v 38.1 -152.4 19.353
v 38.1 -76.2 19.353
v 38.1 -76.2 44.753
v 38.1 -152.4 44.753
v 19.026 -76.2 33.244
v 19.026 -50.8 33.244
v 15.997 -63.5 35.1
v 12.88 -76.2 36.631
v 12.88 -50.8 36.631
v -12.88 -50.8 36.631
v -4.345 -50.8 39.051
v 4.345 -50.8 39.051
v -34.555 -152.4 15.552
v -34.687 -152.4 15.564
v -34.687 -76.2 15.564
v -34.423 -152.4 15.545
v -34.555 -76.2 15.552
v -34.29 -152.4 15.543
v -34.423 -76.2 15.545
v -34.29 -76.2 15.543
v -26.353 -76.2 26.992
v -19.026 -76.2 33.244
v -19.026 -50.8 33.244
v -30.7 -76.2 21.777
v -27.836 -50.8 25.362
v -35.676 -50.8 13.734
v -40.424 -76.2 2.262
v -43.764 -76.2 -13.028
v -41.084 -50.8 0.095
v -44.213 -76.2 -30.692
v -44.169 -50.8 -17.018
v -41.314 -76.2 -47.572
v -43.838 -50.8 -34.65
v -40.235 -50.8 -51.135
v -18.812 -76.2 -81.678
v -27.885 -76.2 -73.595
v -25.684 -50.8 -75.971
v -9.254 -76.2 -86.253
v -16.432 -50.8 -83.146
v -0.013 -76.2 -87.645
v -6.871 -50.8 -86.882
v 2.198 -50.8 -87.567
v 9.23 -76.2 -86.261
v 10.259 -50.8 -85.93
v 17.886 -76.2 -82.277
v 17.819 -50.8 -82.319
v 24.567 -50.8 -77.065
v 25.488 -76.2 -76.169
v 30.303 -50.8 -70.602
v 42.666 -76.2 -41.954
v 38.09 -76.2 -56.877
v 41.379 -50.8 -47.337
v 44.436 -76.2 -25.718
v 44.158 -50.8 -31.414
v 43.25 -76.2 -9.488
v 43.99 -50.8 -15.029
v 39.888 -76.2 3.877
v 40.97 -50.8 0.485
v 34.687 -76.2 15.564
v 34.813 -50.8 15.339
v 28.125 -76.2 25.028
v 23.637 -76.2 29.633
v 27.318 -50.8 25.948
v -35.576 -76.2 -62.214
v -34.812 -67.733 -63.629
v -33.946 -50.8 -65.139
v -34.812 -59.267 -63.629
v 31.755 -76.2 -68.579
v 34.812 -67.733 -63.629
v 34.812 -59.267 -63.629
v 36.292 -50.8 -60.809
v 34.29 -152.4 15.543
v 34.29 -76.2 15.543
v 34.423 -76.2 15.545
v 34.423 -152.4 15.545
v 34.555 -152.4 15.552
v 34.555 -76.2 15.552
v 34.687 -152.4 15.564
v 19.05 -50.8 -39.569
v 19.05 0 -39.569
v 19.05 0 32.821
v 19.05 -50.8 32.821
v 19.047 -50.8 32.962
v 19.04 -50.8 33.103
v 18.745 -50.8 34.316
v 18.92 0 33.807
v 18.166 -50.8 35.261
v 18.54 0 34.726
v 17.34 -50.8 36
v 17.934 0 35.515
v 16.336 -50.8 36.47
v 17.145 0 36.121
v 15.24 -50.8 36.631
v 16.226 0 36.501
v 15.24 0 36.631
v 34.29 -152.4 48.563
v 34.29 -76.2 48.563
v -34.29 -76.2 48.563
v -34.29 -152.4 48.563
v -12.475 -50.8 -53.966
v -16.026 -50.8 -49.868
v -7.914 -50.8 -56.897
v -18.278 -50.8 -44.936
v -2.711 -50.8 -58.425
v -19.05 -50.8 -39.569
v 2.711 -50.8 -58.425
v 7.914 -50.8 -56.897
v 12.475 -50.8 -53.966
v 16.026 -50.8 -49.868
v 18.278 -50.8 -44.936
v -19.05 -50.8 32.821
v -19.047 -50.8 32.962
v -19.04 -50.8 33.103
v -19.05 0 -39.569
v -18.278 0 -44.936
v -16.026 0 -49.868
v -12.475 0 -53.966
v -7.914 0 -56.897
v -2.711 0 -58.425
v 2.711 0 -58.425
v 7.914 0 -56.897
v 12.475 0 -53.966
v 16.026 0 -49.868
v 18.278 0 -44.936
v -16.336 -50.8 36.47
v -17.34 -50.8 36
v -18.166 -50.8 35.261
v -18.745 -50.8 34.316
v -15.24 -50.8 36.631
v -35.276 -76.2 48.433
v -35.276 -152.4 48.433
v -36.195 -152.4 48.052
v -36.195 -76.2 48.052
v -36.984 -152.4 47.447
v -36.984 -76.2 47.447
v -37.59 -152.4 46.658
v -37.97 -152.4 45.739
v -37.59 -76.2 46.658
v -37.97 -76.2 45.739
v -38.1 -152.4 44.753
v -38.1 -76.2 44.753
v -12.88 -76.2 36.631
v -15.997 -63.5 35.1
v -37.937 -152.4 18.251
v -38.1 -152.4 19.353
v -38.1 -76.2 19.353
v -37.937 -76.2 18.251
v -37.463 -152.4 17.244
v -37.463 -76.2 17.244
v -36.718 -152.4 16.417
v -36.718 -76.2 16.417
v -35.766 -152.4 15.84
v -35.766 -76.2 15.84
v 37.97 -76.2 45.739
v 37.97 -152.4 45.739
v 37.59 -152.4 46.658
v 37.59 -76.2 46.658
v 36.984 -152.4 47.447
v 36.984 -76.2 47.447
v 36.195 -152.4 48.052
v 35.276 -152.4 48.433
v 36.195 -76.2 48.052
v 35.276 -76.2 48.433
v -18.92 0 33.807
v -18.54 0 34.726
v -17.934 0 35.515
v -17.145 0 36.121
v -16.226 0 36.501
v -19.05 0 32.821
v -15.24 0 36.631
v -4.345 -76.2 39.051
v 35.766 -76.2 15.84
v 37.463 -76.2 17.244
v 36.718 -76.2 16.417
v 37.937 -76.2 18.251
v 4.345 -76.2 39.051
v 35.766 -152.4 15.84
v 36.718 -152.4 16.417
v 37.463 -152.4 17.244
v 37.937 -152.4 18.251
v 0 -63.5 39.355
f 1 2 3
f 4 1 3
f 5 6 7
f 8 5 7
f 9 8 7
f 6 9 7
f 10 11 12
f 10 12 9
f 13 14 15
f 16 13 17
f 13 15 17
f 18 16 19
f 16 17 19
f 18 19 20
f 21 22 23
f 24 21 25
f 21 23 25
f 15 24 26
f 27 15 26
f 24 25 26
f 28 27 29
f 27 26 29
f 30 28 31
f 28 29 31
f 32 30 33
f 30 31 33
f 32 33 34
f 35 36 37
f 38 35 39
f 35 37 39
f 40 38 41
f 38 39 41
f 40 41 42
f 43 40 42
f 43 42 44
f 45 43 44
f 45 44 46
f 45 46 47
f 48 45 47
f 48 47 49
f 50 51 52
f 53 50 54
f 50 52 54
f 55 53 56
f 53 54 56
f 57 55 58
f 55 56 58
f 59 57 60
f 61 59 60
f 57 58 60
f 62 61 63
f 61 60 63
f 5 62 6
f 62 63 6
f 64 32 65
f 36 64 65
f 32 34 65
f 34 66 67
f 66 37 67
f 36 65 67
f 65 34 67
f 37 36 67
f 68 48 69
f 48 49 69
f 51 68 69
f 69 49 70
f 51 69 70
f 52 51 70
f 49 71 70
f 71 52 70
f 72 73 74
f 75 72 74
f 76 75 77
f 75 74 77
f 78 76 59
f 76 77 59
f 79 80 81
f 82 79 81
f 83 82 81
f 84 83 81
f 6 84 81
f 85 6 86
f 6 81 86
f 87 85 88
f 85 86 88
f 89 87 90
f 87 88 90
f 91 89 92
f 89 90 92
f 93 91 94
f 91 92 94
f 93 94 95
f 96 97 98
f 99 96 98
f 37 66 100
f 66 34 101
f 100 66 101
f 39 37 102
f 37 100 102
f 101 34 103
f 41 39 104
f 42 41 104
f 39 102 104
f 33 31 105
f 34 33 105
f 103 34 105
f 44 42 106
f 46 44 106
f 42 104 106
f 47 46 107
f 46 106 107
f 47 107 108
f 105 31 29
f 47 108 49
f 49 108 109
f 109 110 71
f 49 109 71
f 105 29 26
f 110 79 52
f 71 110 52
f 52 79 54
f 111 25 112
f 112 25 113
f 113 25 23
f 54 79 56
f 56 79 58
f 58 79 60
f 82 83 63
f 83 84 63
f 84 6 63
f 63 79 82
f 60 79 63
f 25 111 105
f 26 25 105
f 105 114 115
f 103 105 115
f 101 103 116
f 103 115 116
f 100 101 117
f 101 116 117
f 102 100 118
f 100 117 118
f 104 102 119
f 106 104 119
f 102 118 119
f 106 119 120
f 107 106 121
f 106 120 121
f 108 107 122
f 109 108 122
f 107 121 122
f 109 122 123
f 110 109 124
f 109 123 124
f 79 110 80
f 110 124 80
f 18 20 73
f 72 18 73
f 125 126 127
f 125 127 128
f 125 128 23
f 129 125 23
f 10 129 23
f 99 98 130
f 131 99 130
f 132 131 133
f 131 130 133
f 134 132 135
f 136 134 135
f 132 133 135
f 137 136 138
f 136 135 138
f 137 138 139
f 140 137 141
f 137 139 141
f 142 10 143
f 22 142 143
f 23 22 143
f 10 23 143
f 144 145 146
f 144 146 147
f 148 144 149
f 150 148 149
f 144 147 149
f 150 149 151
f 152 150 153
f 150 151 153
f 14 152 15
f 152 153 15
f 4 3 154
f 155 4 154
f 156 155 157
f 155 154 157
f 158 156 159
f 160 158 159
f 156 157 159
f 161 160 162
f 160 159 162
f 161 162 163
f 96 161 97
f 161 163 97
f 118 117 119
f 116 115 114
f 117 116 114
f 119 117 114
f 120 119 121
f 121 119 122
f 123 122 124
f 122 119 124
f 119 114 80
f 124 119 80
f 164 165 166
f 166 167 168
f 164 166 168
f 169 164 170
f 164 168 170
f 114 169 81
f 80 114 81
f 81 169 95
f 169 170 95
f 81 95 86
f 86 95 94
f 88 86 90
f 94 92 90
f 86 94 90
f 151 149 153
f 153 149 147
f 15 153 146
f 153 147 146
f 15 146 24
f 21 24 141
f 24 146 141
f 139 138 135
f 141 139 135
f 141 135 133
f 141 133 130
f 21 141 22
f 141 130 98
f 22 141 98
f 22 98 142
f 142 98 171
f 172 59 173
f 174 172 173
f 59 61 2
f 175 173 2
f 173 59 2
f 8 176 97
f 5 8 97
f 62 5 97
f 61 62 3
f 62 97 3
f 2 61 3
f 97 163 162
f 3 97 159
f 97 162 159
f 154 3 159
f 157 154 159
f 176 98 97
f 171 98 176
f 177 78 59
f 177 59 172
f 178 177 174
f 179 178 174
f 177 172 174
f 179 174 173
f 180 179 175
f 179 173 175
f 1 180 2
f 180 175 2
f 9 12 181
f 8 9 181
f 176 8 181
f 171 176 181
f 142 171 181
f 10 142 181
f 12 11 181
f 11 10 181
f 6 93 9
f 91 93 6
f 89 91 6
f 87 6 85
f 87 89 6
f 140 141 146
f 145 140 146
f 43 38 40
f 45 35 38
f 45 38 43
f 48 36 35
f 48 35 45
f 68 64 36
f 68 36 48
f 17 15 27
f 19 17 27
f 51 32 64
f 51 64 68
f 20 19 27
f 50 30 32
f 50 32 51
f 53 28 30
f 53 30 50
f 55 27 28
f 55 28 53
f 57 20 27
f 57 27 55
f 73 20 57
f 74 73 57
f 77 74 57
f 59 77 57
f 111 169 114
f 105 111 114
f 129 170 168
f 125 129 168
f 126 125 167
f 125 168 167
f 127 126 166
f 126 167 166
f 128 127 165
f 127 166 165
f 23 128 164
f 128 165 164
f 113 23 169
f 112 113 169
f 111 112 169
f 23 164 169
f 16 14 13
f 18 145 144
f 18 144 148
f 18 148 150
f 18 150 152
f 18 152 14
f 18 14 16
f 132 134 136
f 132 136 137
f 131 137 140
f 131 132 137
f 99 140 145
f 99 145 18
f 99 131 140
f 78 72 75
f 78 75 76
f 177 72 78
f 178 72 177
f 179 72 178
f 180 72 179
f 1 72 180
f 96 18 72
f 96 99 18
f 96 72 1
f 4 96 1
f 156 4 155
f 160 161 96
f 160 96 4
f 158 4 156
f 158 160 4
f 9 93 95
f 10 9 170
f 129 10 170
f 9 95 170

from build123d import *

# Parameters (mm, degrees)
F1_DEPTH = 50.8
F3_DEPTH = 25.4
F5_DEPTH = 76.2


with BuildPart() as f1:
    # F0 (on Front) → F1 (new body)
    with BuildSketch(Plane.XZ):
        with BuildLine():
            ThreePointArc((19.05, 32.821028), (17.934077, 35.515105), (15.24, 36.631028))
            Line((15.24, 36.631028), (-15.24, 36.631028))
            ThreePointArc((-15.24, 36.631028), (-17.934077, 35.515105), (-19.05, 32.821028))
            Line((-19.05, 32.821028), (-19.05, -39.568972))
            Line((-19.05, -39.568972), (19.05, -39.568972))
            Line((19.05, -39.568972), (19.05, 32.821028))
        make_face()
        with BuildLine():
            ThreePointArc((-19.05, -39.568972), (0, -58.618972), (19.05, -39.568972))
            Line((19.05, -39.568972), (-19.05, -39.568972))
        make_face()
    extrude(amount=F1_DEPTH)

    # F2 (on face) → F3 (join)
    with BuildSketch(Plane.XZ.offset(50.8)):
        with BuildLine():
            ThreePointArc((-19.05, 32.821028), (-19.044109, 33.032818), (-19.026454, 33.243953))
            add(Edge.make_bspline(
                [(-19.026454, 33.243953), (-69.624273, -0.990803), (-34.812137, -63.629114), (0, -126.267426), (34.812137, -63.629114), (69.624273, -0.990803), (19.026454, 33.243953)],
                knots=[0.442325, 0.442325, 0.442325, 2.241837, 2.241837, 4.041349, 4.041349, 5.84086, 5.84086, 5.84086], degree=2, weights=[1, 0.621801, 1, 0.621801, 1, 0.621801, 1]))
            ThreePointArc((19.026454, 33.243953), (19.044109, 33.032818), (19.05, 32.821028))
            Line((19.05, 32.821028), (19.05, -39.568972))
            ThreePointArc((19.05, -39.568972), (0, -58.618972), (-19.05, -39.568972))
            Line((-19.05, -39.568972), (-19.05, 32.821028))
        make_face()
        with BuildLine():
            Line((12.879918, 36.631028), (-12.879918, 36.631028))
            add(Edge.make_bspline(
                [(-12.879918, 36.631028), (-16.041278, 35.263738), (-19.026454, 33.243953)],
                knots=[0.293978, 0.293978, 0.293978, 0.442325, 0.442325, 0.442325], degree=2, weights=[1, 0.99725, 1]))
            ThreePointArc((-19.026454, 33.243953), (-19.044109, 33.032818), (-19.05, 32.821028))
            Line((-19.05, 32.821028), (-19.05, -39.568972))
            ThreePointArc((-19.05, -39.568972), (0, -58.618972), (19.05, -39.568972))
            Line((19.05, -39.568972), (19.05, 32.821028))
            ThreePointArc((19.05, 32.821028), (19.044109, 33.032818), (19.026454, 33.243953))
            add(Edge.make_bspline(
                [(19.026454, 33.243953), (16.041278, 35.263738), (12.879918, 36.631028)],
                knots=[5.84086, 5.84086, 5.84086, 5.989207, 5.989207, 5.989207], degree=2, weights=[1, 0.99725, 1]))
        make_face()
        with BuildLine():
            add(Edge.make_bspline(
                [(12.879918, 36.631028), (6.581128, 39.355257), (0, 39.355257)],
                knots=[5.989207, 5.989207, 5.989207, 6.283185, 6.283185, 6.283185], degree=2, weights=[1, 0.989217, 1]))
            add(Edge.make_bspline(
                [(0, 39.355257), (-6.581128, 39.355257), (-12.879918, 36.631028)],
                knots=[0, 0, 0, 0.293978, 0.293978, 0.293978], degree=2, weights=[1, 0.989217, 1]))
            Line((-12.879918, 36.631028), (12.879918, 36.631028))
        make_face()
    extrude(amount=F3_DEPTH)

    # F4 (on face) → F5 (join)
    with BuildSketch(Plane.XZ.offset(76.2)):
        with BuildLine():
            ThreePointArc((-38.1, 19.352757), (-37.121005, 16.802951), (-34.687134, 15.563511))
            add(Edge.make_bspline(
                [(-19.026454, 33.243953), (-28.282625, 26.981178), (-34.687134, 15.563511)],
                knots=[0.442325, 0.442325, 0.442325, 0.918738, 0.918738, 0.918738], degree=2, weights=[1, 0.899873, 0.852763]))
            add(Edge.make_bspline(
                [(-12.879918, 36.631028), (-16.041278, 35.263738), (-19.026454, 33.243953)],
                knots=[0.293978, 0.293978, 0.293978, 0.442325, 0.442325, 0.442325], degree=2, weights=[1, 0.99725, 1]))
            add(Edge.make_bspline(
                [(0, 39.355257), (-6.581128, 39.355257), (-12.879918, 36.631028)],
                knots=[0, 0, 0, 0.293978, 0.293978, 0.293978], degree=2, weights=[1, 0.989217, 1]))
            add(Edge.make_bspline(
                [(12.879918, 36.631028), (6.581128, 39.355257), (0, 39.355257)],
                knots=[5.989207, 5.989207, 5.989207, 6.283185, 6.283185, 6.283185], degree=2, weights=[1, 0.989217, 1]))
            add(Edge.make_bspline(
                [(19.026454, 33.243953), (16.041278, 35.263738), (12.879918, 36.631028)],
                knots=[5.84086, 5.84086, 5.84086, 5.989207, 5.989207, 5.989207], degree=2, weights=[1, 0.99725, 1]))
            add(Edge.make_bspline(
                [(34.687134, 15.563511), (28.282625, 26.981178), (19.026454, 33.243953)],
                knots=[5.364447, 5.364447, 5.364447, 5.84086, 5.84086, 5.84086], degree=2, weights=[0.852763, 0.899873, 1]))
            ThreePointArc((34.687134, 15.563511), (37.121005, 16.802951), (38.1, 19.352757))
            Line((38.1, 19.352757), (38.1, 44.752757))
            ThreePointArc((38.1, 44.752757), (36.984077, 47.446834), (34.29, 48.562757))
            Line((34.29, 48.562757), (-34.29, 48.562757))
            ThreePointArc((-34.29, 48.562757), (-36.984077, 47.446834), (-38.1, 44.752757))
            Line((-38.1, 44.752757), (-38.1, 19.352757))
        make_face()
        with BuildLine():
            ThreePointArc((-34.687134, 15.563511), (-34.488838, 15.547949), (-34.29, 15.542757))
            Line((-34.29, 15.542757), (34.29, 15.542757))
            ThreePointArc((34.29, 15.542757), (34.488838, 15.547949), (34.687134, 15.563511))
            add(Edge.make_bspline(
                [(34.687134, 15.563511), (28.282625, 26.981178), (19.026454, 33.243953)],
                knots=[5.364447, 5.364447, 5.364447, 5.84086, 5.84086, 5.84086], degree=2, weights=[0.852763, 0.899873, 1]))
            add(Edge.make_bspline(
                [(19.026454, 33.243953), (16.041278, 35.263738), (12.879918, 36.631028)],
                knots=[5.84086, 5.84086, 5.84086, 5.989207, 5.989207, 5.989207], degree=2, weights=[1, 0.99725, 1]))
            add(Edge.make_bspline(
                [(12.879918, 36.631028), (6.581128, 39.355257), (0, 39.355257)],
                knots=[5.989207, 5.989207, 5.989207, 6.283185, 6.283185, 6.283185], degree=2, weights=[1, 0.989217, 1]))
            add(Edge.make_bspline(
                [(0, 39.355257), (-6.581128, 39.355257), (-12.879918, 36.631028)],
                knots=[0, 0, 0, 0.293978, 0.293978, 0.293978], degree=2, weights=[1, 0.989217, 1]))
            add(Edge.make_bspline(
                [(-12.879918, 36.631028), (-16.041278, 35.263738), (-19.026454, 33.243953)],
                knots=[0.293978, 0.293978, 0.293978, 0.442325, 0.442325, 0.442325], degree=2, weights=[1, 0.99725, 1]))
            add(Edge.make_bspline(
                [(-19.026454, 33.243953), (-28.282625, 26.981178), (-34.687134, 15.563511)],
                knots=[0.442325, 0.442325, 0.442325, 0.918738, 0.918738, 0.918738], degree=2, weights=[1, 0.899873, 0.852763]))
        make_face()
    extrude(amount=F5_DEPTH)


solid = f1.part
